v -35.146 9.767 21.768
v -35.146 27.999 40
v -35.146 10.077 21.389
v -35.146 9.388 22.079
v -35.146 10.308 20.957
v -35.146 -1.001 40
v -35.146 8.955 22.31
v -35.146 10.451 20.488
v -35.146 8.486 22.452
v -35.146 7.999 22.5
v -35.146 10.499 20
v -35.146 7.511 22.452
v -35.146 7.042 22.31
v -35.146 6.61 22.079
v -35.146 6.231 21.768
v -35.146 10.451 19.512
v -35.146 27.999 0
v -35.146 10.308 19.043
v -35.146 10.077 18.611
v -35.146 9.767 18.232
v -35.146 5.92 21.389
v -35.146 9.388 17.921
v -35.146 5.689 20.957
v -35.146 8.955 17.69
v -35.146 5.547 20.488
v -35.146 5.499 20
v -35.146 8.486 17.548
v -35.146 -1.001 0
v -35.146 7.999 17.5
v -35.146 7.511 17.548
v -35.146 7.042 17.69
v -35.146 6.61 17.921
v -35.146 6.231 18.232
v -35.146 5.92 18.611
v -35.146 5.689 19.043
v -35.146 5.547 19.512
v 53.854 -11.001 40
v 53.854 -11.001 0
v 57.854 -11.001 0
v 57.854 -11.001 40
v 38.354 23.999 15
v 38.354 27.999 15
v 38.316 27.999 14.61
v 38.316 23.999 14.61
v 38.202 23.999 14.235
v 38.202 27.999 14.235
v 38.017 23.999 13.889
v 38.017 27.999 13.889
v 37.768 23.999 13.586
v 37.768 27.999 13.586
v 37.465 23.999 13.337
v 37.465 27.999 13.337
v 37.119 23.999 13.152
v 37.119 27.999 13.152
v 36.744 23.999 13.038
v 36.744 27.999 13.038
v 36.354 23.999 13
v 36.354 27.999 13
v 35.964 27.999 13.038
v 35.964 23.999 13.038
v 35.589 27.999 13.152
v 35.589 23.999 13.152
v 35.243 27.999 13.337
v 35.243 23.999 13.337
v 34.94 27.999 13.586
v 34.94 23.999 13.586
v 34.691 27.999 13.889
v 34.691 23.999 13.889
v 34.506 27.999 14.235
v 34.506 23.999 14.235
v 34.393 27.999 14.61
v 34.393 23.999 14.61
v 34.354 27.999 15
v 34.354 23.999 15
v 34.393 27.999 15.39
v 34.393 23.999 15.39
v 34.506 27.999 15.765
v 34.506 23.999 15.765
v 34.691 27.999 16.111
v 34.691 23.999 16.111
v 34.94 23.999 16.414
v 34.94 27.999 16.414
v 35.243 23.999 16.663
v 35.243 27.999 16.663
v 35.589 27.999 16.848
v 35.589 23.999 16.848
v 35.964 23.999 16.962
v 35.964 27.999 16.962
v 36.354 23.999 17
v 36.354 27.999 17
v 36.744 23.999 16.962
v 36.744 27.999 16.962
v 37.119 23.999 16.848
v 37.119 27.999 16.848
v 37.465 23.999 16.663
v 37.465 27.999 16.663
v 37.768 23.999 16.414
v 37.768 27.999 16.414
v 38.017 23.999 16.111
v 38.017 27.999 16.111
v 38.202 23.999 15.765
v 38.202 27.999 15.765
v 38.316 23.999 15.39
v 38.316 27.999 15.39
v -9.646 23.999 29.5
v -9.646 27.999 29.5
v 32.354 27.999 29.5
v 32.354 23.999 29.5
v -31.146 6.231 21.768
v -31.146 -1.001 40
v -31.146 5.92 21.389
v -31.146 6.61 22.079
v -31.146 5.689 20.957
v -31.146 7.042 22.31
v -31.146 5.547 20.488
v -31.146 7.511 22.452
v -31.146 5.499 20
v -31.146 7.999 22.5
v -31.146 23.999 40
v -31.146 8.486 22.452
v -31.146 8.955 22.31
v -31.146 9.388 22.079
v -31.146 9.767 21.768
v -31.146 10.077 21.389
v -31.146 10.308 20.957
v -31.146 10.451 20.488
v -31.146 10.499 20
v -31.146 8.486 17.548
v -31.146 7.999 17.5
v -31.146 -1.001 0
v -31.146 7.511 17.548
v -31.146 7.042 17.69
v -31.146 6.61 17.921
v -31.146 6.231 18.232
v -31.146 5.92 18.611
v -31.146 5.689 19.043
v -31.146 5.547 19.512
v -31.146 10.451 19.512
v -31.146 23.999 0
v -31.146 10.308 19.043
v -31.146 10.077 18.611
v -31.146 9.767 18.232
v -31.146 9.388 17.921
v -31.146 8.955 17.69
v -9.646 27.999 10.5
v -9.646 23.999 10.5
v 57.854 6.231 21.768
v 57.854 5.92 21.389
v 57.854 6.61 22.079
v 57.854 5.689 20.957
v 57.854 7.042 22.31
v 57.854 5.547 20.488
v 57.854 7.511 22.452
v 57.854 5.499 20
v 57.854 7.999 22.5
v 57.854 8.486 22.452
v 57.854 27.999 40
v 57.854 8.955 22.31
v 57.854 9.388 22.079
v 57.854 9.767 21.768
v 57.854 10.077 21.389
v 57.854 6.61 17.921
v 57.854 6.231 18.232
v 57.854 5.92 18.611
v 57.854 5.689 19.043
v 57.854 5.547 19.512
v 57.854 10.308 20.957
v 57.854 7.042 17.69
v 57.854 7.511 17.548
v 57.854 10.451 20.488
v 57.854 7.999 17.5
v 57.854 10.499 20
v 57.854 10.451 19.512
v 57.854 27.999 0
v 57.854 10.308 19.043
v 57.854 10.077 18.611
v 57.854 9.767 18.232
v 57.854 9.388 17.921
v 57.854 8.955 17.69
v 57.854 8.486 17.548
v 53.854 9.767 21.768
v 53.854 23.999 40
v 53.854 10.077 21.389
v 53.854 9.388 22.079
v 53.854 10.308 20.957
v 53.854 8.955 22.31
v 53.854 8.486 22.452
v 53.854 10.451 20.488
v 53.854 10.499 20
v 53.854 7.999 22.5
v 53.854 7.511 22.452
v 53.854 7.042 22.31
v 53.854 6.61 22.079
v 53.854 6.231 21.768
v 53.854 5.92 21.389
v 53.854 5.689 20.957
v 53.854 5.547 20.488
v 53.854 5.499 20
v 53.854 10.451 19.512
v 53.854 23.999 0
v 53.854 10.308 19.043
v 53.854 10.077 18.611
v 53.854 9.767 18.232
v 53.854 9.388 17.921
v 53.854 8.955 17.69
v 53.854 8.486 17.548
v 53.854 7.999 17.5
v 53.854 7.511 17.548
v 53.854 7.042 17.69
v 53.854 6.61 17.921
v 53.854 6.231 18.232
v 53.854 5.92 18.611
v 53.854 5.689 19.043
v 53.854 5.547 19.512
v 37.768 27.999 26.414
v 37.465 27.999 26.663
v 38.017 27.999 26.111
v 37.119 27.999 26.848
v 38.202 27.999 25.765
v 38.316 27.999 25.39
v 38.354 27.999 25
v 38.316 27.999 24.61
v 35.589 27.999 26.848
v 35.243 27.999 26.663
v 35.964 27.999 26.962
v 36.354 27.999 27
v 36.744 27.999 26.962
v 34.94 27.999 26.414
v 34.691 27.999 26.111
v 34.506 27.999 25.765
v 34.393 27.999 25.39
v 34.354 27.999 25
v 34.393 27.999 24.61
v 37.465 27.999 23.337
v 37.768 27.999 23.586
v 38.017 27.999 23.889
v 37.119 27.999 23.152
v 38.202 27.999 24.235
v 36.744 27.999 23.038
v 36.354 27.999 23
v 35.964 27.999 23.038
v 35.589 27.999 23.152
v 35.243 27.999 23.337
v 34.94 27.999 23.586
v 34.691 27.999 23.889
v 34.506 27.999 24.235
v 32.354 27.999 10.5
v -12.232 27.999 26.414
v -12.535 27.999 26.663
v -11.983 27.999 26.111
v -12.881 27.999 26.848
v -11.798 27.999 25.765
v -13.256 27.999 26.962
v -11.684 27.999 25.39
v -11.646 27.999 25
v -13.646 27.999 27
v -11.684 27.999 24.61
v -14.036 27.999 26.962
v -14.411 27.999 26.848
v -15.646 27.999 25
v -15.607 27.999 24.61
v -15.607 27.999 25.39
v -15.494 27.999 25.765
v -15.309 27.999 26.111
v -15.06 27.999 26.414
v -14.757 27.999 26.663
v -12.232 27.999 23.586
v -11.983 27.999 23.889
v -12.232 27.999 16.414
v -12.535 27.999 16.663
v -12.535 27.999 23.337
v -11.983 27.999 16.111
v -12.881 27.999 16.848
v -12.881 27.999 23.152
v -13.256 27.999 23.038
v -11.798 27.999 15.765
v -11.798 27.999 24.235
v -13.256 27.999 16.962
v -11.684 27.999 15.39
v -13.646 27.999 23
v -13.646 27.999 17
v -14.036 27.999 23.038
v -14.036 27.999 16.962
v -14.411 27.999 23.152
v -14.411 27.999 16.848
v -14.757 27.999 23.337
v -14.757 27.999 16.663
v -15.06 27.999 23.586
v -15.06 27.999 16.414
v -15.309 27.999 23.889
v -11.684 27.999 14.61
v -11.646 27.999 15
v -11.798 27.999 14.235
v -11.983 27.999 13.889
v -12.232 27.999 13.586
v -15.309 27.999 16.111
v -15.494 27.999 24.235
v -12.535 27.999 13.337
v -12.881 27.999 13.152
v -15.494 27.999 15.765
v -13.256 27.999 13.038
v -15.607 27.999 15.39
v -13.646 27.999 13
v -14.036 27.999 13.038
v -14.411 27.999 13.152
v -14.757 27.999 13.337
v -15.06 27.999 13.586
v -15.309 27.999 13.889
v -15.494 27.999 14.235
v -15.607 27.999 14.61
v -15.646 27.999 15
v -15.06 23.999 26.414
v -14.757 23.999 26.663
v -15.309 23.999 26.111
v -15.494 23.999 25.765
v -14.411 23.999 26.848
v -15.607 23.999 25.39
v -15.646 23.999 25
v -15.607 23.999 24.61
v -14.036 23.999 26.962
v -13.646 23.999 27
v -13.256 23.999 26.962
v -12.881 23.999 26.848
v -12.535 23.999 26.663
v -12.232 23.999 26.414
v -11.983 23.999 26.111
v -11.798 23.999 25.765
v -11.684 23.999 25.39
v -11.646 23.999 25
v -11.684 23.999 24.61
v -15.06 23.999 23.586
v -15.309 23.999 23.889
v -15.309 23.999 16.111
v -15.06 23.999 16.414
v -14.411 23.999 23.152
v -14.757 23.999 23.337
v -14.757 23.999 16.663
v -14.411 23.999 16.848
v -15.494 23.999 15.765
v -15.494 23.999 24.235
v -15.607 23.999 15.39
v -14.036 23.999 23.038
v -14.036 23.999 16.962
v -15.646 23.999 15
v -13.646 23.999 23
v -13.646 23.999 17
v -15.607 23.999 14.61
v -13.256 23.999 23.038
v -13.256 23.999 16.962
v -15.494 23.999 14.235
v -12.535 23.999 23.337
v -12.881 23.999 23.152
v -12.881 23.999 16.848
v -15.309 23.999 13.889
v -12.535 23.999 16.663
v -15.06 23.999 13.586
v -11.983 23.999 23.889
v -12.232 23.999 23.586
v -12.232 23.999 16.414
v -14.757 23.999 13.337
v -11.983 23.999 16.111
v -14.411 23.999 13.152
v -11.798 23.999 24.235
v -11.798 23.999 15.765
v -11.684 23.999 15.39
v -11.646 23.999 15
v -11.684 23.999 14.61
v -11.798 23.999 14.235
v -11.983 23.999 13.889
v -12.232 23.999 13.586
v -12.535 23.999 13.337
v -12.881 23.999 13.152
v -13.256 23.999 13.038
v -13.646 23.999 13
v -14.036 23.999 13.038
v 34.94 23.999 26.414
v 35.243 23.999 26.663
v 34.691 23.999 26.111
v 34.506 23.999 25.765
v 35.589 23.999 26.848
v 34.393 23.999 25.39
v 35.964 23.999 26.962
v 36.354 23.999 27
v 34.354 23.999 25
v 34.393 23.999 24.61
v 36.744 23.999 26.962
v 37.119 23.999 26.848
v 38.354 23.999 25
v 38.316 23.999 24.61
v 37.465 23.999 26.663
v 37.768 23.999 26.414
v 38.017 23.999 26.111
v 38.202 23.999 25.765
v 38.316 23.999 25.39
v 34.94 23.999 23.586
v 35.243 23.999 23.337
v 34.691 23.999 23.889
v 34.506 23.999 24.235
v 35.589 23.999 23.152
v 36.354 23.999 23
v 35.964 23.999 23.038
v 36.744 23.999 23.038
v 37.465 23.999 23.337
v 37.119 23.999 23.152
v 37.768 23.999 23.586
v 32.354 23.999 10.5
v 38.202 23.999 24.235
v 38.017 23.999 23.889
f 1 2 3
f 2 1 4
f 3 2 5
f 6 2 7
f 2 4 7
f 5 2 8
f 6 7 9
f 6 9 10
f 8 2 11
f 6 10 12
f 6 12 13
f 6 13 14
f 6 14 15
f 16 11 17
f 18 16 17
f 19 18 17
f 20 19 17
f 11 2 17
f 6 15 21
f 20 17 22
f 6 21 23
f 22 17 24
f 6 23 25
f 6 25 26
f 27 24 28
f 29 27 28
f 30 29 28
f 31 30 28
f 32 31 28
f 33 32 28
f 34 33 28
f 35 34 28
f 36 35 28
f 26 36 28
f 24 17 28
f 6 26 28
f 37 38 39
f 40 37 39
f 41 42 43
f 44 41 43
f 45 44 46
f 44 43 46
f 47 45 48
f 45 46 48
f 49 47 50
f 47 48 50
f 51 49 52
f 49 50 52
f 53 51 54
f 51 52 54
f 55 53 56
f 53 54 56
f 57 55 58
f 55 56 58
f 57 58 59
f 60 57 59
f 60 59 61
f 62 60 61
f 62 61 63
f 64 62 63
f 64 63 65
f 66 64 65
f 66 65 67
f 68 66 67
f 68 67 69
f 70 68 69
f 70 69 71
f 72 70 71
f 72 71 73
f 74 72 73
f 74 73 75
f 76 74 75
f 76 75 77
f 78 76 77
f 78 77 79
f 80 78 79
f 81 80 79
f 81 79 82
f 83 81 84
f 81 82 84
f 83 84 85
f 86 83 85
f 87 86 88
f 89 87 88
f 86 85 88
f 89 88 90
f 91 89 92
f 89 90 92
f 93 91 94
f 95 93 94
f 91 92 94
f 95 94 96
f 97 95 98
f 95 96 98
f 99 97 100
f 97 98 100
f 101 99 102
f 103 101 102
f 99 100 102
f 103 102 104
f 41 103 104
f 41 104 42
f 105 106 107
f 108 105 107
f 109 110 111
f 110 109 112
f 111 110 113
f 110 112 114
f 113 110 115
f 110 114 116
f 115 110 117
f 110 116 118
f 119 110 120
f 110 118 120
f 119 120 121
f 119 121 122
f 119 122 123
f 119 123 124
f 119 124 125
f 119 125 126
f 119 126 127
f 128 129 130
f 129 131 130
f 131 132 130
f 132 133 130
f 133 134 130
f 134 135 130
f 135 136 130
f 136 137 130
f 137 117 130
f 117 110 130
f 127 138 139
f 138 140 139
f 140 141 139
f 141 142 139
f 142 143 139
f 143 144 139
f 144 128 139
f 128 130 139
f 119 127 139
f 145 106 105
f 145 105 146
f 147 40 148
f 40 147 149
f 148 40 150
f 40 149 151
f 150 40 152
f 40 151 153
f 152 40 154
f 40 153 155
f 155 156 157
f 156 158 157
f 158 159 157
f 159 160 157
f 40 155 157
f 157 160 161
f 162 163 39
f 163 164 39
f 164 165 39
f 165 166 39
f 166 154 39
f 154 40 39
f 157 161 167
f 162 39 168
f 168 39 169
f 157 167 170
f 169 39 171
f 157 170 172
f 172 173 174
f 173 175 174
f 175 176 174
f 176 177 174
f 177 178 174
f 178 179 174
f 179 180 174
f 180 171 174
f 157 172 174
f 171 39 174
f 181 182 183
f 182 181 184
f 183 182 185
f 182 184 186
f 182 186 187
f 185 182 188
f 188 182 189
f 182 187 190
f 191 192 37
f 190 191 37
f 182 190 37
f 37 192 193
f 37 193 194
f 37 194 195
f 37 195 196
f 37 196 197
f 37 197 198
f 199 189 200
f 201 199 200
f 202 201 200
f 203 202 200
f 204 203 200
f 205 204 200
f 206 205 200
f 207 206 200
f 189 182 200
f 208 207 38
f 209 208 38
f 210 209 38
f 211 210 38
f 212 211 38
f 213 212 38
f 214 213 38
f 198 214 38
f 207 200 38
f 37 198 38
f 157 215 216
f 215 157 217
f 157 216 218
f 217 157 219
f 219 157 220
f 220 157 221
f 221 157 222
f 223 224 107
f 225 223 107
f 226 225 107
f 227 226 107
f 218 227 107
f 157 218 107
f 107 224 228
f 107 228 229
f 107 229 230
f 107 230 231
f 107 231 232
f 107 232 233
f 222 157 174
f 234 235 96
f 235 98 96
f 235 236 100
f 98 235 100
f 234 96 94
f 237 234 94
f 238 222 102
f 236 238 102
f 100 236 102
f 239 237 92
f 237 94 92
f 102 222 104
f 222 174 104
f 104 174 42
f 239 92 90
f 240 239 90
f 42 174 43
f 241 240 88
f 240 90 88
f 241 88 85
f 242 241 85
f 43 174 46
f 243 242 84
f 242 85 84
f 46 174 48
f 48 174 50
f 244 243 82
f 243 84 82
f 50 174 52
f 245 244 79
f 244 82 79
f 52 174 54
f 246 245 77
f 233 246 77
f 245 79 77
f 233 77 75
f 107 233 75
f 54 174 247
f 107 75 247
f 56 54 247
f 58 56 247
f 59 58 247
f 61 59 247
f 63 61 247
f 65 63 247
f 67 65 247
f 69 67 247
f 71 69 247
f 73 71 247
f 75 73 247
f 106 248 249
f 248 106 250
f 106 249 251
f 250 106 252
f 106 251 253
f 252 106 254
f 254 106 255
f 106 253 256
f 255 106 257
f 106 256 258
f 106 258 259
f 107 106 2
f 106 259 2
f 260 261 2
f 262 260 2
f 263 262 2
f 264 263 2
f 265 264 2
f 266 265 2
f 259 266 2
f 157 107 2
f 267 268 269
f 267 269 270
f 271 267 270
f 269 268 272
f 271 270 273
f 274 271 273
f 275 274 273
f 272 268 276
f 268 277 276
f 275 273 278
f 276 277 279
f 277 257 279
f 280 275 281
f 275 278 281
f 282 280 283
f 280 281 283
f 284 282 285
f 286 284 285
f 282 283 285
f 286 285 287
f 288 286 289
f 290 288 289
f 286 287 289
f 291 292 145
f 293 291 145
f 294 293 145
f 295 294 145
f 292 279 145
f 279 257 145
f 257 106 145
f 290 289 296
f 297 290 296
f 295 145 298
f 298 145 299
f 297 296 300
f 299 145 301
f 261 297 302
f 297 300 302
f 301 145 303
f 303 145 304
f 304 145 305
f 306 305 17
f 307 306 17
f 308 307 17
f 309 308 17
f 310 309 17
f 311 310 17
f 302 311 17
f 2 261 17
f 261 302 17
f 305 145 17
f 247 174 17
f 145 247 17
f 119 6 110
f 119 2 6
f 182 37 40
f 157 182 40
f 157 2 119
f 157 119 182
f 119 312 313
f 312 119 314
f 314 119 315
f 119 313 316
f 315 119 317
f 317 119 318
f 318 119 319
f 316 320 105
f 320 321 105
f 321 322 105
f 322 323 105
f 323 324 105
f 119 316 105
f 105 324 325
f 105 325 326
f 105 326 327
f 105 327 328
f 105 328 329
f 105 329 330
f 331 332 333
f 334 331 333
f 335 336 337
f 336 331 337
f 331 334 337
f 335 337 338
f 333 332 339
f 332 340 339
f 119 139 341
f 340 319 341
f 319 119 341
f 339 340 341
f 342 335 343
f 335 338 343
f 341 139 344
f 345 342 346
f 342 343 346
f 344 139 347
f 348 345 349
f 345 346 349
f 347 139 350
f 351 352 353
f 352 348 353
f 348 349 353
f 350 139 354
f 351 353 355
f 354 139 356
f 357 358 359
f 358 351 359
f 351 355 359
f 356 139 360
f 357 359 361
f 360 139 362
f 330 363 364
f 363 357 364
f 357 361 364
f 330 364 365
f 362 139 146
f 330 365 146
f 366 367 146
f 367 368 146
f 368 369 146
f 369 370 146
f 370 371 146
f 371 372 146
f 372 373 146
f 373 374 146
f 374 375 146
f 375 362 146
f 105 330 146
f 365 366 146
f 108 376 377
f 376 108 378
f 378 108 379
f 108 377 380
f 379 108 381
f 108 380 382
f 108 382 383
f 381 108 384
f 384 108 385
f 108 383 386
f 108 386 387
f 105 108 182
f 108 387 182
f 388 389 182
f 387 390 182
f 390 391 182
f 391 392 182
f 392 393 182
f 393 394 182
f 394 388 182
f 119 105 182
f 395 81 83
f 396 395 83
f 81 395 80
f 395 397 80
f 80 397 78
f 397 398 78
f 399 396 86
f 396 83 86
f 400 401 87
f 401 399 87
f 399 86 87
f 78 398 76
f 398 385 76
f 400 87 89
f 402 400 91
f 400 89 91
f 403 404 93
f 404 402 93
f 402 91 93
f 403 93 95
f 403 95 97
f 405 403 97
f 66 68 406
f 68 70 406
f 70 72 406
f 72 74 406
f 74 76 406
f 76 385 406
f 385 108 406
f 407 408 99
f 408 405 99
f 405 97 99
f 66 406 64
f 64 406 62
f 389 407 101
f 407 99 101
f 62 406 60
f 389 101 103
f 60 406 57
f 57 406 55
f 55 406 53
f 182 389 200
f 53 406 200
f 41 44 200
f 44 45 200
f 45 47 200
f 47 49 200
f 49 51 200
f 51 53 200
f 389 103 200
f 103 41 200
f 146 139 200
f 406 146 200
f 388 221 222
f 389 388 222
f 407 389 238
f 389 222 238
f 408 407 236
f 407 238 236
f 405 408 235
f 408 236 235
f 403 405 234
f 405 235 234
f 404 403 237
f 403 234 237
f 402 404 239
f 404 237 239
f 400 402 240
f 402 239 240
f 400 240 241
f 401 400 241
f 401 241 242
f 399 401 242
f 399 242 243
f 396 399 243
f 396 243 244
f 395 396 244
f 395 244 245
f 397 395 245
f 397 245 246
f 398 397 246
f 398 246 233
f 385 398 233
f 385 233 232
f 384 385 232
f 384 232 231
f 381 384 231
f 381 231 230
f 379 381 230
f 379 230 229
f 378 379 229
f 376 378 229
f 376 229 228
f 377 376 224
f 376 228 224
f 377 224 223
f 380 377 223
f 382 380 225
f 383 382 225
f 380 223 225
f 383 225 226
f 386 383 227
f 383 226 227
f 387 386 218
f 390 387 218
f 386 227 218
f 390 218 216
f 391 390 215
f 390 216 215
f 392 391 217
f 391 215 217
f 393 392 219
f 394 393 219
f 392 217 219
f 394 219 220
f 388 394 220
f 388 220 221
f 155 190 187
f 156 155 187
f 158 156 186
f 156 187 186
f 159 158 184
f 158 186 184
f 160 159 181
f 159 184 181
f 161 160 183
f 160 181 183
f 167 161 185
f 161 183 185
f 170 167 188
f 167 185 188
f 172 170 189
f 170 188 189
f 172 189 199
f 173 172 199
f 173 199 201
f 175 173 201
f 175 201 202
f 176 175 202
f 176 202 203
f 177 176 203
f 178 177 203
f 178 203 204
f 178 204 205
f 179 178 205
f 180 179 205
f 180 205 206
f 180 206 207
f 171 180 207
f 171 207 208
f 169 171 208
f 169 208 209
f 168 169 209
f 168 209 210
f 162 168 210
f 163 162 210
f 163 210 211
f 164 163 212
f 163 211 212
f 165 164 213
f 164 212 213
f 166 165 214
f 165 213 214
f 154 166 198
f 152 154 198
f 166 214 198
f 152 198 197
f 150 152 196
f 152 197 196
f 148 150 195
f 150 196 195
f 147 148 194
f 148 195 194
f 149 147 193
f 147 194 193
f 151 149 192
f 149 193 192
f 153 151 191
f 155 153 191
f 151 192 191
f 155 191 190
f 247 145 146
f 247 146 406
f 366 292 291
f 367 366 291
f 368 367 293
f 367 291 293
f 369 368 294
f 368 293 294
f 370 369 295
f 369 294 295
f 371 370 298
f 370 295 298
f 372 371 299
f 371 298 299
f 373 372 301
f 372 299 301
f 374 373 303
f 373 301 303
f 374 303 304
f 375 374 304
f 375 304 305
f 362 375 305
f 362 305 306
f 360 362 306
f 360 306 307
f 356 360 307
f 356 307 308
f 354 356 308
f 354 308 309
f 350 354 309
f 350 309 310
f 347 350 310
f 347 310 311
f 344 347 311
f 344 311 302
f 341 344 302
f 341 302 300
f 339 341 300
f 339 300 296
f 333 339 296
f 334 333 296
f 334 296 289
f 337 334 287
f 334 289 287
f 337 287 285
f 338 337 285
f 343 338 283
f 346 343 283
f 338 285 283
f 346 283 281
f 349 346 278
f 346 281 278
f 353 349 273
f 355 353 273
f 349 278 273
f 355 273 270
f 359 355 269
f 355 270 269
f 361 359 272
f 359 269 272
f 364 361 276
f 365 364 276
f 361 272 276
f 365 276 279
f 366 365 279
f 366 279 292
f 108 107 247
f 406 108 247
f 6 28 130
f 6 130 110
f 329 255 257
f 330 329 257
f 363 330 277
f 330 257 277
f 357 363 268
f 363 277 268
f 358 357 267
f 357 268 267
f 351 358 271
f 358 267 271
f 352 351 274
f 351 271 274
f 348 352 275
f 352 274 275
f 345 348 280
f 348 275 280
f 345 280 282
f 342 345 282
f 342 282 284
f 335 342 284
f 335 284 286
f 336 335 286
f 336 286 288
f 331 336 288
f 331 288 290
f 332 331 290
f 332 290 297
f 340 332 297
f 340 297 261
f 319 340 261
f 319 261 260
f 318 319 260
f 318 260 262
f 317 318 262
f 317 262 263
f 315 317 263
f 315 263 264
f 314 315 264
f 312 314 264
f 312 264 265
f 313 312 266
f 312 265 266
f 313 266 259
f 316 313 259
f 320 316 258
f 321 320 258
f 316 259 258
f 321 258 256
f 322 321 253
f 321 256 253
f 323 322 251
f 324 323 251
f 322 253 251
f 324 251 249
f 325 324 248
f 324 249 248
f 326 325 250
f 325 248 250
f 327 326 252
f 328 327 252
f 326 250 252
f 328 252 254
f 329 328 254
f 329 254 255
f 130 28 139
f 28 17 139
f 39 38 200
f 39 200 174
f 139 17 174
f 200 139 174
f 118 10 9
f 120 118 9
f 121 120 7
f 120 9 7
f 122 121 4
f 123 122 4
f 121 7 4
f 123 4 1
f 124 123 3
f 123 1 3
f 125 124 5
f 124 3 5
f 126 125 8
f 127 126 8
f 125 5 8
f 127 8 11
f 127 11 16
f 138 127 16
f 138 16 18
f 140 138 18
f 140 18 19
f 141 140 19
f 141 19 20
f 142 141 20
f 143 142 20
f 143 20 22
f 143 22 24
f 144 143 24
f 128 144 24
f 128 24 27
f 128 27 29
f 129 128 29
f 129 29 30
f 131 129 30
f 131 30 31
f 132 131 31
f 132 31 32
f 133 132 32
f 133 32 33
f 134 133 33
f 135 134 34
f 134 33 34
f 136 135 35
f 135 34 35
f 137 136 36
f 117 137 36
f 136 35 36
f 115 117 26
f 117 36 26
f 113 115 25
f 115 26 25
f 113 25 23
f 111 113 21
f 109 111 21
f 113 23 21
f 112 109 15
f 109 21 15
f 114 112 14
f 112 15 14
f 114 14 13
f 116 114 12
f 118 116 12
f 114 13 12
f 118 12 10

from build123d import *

# Parameters (mm, degrees)
SALIENTE_EXTRUIR1_DEPTH = 40
CROQUIS3_R              = 2.5
CORTAR_EXTRUIR1_DEPTH   = 94
CROQUIS5_W              = 40
CROQUIS5_H              = 10
CORTAR_EXTRUIR2_DEPTH   = 40
CROQUIS6_W              = 42
CROQUIS6_H              = 19
CORTAR_EXTRUIR3_DEPTH   = 10
CROQUIS7_R              = 2
CORTAR_EXTRUIR4_DEPTH   = 10


with BuildPart() as part:
    # Croquis2 → Saliente-Extruir1 (new body)
    with BuildSketch(Plane.XY):
        Polygon((-31.145916957, -11.001243781), (-31.145916957, 23.998756219), (53.854083043, 23.998756219), (53.854083043, -11.001243781), (57.854083043, -11.001243781), (57.854083043, 27.998756219), (-35.145916957, 27.998756219), (-35.145916957, -11.001243781), align=None)
    extrude(amount=SALIENTE_EXTRUIR1_DEPTH)

    # Croquis3 → Cortar-Extruir1 (cut, through all)
    with BuildSketch(Plane.ZY.offset(35.145916957)):
        with Locations((20, 7.998756219)):
            Circle(CROQUIS3_R)
    extrude(amount=-CORTAR_EXTRUIR1_DEPTH, mode=Mode.SUBTRACT)

    # Croquis5 → Cortar-Extruir2 (cut)
    with BuildSketch(Plane.ZY.offset(35.145916957)):
        with Locations((20, -6.001243781)):
            Rectangle(CROQUIS5_W, CROQUIS5_H)
    extrude(amount=-CORTAR_EXTRUIR2_DEPTH, mode=Mode.SUBTRACT)

    # Croquis6 → Cortar-Extruir3 (cut)
    with BuildSketch(Plane(origin=(0, 27.998756219, 0), x_dir=(1, 0, 0), z_dir=(0, 1, 0))):
        with Locations((11.354083043, -20)):
            Rectangle(CROQUIS6_W, CROQUIS6_H)
    extrude(amount=-CORTAR_EXTRUIR3_DEPTH, mode=Mode.SUBTRACT)

    # Croquis7 → Cortar-Extruir4 (cut)
    with BuildSketch(Plane(origin=(0, 27.998756219, 0), x_dir=(1, 0, 0), z_dir=(0, 1, 0))):
        with Locations((-13.645916957, -15)):
            Circle(CROQUIS7_R)
        with Locations((-13.645916957, -25)):
            Circle(CROQUIS7_R)
        with Locations((36.354083043, -15)):
            Circle(CROQUIS7_R)
        with Locations((36.354083043, -25)):
            Circle(CROQUIS7_R)
    extrude(amount=-CORTAR_EXTRUIR4_DEPTH, mode=Mode.SUBTRACT)


solid = part.part
